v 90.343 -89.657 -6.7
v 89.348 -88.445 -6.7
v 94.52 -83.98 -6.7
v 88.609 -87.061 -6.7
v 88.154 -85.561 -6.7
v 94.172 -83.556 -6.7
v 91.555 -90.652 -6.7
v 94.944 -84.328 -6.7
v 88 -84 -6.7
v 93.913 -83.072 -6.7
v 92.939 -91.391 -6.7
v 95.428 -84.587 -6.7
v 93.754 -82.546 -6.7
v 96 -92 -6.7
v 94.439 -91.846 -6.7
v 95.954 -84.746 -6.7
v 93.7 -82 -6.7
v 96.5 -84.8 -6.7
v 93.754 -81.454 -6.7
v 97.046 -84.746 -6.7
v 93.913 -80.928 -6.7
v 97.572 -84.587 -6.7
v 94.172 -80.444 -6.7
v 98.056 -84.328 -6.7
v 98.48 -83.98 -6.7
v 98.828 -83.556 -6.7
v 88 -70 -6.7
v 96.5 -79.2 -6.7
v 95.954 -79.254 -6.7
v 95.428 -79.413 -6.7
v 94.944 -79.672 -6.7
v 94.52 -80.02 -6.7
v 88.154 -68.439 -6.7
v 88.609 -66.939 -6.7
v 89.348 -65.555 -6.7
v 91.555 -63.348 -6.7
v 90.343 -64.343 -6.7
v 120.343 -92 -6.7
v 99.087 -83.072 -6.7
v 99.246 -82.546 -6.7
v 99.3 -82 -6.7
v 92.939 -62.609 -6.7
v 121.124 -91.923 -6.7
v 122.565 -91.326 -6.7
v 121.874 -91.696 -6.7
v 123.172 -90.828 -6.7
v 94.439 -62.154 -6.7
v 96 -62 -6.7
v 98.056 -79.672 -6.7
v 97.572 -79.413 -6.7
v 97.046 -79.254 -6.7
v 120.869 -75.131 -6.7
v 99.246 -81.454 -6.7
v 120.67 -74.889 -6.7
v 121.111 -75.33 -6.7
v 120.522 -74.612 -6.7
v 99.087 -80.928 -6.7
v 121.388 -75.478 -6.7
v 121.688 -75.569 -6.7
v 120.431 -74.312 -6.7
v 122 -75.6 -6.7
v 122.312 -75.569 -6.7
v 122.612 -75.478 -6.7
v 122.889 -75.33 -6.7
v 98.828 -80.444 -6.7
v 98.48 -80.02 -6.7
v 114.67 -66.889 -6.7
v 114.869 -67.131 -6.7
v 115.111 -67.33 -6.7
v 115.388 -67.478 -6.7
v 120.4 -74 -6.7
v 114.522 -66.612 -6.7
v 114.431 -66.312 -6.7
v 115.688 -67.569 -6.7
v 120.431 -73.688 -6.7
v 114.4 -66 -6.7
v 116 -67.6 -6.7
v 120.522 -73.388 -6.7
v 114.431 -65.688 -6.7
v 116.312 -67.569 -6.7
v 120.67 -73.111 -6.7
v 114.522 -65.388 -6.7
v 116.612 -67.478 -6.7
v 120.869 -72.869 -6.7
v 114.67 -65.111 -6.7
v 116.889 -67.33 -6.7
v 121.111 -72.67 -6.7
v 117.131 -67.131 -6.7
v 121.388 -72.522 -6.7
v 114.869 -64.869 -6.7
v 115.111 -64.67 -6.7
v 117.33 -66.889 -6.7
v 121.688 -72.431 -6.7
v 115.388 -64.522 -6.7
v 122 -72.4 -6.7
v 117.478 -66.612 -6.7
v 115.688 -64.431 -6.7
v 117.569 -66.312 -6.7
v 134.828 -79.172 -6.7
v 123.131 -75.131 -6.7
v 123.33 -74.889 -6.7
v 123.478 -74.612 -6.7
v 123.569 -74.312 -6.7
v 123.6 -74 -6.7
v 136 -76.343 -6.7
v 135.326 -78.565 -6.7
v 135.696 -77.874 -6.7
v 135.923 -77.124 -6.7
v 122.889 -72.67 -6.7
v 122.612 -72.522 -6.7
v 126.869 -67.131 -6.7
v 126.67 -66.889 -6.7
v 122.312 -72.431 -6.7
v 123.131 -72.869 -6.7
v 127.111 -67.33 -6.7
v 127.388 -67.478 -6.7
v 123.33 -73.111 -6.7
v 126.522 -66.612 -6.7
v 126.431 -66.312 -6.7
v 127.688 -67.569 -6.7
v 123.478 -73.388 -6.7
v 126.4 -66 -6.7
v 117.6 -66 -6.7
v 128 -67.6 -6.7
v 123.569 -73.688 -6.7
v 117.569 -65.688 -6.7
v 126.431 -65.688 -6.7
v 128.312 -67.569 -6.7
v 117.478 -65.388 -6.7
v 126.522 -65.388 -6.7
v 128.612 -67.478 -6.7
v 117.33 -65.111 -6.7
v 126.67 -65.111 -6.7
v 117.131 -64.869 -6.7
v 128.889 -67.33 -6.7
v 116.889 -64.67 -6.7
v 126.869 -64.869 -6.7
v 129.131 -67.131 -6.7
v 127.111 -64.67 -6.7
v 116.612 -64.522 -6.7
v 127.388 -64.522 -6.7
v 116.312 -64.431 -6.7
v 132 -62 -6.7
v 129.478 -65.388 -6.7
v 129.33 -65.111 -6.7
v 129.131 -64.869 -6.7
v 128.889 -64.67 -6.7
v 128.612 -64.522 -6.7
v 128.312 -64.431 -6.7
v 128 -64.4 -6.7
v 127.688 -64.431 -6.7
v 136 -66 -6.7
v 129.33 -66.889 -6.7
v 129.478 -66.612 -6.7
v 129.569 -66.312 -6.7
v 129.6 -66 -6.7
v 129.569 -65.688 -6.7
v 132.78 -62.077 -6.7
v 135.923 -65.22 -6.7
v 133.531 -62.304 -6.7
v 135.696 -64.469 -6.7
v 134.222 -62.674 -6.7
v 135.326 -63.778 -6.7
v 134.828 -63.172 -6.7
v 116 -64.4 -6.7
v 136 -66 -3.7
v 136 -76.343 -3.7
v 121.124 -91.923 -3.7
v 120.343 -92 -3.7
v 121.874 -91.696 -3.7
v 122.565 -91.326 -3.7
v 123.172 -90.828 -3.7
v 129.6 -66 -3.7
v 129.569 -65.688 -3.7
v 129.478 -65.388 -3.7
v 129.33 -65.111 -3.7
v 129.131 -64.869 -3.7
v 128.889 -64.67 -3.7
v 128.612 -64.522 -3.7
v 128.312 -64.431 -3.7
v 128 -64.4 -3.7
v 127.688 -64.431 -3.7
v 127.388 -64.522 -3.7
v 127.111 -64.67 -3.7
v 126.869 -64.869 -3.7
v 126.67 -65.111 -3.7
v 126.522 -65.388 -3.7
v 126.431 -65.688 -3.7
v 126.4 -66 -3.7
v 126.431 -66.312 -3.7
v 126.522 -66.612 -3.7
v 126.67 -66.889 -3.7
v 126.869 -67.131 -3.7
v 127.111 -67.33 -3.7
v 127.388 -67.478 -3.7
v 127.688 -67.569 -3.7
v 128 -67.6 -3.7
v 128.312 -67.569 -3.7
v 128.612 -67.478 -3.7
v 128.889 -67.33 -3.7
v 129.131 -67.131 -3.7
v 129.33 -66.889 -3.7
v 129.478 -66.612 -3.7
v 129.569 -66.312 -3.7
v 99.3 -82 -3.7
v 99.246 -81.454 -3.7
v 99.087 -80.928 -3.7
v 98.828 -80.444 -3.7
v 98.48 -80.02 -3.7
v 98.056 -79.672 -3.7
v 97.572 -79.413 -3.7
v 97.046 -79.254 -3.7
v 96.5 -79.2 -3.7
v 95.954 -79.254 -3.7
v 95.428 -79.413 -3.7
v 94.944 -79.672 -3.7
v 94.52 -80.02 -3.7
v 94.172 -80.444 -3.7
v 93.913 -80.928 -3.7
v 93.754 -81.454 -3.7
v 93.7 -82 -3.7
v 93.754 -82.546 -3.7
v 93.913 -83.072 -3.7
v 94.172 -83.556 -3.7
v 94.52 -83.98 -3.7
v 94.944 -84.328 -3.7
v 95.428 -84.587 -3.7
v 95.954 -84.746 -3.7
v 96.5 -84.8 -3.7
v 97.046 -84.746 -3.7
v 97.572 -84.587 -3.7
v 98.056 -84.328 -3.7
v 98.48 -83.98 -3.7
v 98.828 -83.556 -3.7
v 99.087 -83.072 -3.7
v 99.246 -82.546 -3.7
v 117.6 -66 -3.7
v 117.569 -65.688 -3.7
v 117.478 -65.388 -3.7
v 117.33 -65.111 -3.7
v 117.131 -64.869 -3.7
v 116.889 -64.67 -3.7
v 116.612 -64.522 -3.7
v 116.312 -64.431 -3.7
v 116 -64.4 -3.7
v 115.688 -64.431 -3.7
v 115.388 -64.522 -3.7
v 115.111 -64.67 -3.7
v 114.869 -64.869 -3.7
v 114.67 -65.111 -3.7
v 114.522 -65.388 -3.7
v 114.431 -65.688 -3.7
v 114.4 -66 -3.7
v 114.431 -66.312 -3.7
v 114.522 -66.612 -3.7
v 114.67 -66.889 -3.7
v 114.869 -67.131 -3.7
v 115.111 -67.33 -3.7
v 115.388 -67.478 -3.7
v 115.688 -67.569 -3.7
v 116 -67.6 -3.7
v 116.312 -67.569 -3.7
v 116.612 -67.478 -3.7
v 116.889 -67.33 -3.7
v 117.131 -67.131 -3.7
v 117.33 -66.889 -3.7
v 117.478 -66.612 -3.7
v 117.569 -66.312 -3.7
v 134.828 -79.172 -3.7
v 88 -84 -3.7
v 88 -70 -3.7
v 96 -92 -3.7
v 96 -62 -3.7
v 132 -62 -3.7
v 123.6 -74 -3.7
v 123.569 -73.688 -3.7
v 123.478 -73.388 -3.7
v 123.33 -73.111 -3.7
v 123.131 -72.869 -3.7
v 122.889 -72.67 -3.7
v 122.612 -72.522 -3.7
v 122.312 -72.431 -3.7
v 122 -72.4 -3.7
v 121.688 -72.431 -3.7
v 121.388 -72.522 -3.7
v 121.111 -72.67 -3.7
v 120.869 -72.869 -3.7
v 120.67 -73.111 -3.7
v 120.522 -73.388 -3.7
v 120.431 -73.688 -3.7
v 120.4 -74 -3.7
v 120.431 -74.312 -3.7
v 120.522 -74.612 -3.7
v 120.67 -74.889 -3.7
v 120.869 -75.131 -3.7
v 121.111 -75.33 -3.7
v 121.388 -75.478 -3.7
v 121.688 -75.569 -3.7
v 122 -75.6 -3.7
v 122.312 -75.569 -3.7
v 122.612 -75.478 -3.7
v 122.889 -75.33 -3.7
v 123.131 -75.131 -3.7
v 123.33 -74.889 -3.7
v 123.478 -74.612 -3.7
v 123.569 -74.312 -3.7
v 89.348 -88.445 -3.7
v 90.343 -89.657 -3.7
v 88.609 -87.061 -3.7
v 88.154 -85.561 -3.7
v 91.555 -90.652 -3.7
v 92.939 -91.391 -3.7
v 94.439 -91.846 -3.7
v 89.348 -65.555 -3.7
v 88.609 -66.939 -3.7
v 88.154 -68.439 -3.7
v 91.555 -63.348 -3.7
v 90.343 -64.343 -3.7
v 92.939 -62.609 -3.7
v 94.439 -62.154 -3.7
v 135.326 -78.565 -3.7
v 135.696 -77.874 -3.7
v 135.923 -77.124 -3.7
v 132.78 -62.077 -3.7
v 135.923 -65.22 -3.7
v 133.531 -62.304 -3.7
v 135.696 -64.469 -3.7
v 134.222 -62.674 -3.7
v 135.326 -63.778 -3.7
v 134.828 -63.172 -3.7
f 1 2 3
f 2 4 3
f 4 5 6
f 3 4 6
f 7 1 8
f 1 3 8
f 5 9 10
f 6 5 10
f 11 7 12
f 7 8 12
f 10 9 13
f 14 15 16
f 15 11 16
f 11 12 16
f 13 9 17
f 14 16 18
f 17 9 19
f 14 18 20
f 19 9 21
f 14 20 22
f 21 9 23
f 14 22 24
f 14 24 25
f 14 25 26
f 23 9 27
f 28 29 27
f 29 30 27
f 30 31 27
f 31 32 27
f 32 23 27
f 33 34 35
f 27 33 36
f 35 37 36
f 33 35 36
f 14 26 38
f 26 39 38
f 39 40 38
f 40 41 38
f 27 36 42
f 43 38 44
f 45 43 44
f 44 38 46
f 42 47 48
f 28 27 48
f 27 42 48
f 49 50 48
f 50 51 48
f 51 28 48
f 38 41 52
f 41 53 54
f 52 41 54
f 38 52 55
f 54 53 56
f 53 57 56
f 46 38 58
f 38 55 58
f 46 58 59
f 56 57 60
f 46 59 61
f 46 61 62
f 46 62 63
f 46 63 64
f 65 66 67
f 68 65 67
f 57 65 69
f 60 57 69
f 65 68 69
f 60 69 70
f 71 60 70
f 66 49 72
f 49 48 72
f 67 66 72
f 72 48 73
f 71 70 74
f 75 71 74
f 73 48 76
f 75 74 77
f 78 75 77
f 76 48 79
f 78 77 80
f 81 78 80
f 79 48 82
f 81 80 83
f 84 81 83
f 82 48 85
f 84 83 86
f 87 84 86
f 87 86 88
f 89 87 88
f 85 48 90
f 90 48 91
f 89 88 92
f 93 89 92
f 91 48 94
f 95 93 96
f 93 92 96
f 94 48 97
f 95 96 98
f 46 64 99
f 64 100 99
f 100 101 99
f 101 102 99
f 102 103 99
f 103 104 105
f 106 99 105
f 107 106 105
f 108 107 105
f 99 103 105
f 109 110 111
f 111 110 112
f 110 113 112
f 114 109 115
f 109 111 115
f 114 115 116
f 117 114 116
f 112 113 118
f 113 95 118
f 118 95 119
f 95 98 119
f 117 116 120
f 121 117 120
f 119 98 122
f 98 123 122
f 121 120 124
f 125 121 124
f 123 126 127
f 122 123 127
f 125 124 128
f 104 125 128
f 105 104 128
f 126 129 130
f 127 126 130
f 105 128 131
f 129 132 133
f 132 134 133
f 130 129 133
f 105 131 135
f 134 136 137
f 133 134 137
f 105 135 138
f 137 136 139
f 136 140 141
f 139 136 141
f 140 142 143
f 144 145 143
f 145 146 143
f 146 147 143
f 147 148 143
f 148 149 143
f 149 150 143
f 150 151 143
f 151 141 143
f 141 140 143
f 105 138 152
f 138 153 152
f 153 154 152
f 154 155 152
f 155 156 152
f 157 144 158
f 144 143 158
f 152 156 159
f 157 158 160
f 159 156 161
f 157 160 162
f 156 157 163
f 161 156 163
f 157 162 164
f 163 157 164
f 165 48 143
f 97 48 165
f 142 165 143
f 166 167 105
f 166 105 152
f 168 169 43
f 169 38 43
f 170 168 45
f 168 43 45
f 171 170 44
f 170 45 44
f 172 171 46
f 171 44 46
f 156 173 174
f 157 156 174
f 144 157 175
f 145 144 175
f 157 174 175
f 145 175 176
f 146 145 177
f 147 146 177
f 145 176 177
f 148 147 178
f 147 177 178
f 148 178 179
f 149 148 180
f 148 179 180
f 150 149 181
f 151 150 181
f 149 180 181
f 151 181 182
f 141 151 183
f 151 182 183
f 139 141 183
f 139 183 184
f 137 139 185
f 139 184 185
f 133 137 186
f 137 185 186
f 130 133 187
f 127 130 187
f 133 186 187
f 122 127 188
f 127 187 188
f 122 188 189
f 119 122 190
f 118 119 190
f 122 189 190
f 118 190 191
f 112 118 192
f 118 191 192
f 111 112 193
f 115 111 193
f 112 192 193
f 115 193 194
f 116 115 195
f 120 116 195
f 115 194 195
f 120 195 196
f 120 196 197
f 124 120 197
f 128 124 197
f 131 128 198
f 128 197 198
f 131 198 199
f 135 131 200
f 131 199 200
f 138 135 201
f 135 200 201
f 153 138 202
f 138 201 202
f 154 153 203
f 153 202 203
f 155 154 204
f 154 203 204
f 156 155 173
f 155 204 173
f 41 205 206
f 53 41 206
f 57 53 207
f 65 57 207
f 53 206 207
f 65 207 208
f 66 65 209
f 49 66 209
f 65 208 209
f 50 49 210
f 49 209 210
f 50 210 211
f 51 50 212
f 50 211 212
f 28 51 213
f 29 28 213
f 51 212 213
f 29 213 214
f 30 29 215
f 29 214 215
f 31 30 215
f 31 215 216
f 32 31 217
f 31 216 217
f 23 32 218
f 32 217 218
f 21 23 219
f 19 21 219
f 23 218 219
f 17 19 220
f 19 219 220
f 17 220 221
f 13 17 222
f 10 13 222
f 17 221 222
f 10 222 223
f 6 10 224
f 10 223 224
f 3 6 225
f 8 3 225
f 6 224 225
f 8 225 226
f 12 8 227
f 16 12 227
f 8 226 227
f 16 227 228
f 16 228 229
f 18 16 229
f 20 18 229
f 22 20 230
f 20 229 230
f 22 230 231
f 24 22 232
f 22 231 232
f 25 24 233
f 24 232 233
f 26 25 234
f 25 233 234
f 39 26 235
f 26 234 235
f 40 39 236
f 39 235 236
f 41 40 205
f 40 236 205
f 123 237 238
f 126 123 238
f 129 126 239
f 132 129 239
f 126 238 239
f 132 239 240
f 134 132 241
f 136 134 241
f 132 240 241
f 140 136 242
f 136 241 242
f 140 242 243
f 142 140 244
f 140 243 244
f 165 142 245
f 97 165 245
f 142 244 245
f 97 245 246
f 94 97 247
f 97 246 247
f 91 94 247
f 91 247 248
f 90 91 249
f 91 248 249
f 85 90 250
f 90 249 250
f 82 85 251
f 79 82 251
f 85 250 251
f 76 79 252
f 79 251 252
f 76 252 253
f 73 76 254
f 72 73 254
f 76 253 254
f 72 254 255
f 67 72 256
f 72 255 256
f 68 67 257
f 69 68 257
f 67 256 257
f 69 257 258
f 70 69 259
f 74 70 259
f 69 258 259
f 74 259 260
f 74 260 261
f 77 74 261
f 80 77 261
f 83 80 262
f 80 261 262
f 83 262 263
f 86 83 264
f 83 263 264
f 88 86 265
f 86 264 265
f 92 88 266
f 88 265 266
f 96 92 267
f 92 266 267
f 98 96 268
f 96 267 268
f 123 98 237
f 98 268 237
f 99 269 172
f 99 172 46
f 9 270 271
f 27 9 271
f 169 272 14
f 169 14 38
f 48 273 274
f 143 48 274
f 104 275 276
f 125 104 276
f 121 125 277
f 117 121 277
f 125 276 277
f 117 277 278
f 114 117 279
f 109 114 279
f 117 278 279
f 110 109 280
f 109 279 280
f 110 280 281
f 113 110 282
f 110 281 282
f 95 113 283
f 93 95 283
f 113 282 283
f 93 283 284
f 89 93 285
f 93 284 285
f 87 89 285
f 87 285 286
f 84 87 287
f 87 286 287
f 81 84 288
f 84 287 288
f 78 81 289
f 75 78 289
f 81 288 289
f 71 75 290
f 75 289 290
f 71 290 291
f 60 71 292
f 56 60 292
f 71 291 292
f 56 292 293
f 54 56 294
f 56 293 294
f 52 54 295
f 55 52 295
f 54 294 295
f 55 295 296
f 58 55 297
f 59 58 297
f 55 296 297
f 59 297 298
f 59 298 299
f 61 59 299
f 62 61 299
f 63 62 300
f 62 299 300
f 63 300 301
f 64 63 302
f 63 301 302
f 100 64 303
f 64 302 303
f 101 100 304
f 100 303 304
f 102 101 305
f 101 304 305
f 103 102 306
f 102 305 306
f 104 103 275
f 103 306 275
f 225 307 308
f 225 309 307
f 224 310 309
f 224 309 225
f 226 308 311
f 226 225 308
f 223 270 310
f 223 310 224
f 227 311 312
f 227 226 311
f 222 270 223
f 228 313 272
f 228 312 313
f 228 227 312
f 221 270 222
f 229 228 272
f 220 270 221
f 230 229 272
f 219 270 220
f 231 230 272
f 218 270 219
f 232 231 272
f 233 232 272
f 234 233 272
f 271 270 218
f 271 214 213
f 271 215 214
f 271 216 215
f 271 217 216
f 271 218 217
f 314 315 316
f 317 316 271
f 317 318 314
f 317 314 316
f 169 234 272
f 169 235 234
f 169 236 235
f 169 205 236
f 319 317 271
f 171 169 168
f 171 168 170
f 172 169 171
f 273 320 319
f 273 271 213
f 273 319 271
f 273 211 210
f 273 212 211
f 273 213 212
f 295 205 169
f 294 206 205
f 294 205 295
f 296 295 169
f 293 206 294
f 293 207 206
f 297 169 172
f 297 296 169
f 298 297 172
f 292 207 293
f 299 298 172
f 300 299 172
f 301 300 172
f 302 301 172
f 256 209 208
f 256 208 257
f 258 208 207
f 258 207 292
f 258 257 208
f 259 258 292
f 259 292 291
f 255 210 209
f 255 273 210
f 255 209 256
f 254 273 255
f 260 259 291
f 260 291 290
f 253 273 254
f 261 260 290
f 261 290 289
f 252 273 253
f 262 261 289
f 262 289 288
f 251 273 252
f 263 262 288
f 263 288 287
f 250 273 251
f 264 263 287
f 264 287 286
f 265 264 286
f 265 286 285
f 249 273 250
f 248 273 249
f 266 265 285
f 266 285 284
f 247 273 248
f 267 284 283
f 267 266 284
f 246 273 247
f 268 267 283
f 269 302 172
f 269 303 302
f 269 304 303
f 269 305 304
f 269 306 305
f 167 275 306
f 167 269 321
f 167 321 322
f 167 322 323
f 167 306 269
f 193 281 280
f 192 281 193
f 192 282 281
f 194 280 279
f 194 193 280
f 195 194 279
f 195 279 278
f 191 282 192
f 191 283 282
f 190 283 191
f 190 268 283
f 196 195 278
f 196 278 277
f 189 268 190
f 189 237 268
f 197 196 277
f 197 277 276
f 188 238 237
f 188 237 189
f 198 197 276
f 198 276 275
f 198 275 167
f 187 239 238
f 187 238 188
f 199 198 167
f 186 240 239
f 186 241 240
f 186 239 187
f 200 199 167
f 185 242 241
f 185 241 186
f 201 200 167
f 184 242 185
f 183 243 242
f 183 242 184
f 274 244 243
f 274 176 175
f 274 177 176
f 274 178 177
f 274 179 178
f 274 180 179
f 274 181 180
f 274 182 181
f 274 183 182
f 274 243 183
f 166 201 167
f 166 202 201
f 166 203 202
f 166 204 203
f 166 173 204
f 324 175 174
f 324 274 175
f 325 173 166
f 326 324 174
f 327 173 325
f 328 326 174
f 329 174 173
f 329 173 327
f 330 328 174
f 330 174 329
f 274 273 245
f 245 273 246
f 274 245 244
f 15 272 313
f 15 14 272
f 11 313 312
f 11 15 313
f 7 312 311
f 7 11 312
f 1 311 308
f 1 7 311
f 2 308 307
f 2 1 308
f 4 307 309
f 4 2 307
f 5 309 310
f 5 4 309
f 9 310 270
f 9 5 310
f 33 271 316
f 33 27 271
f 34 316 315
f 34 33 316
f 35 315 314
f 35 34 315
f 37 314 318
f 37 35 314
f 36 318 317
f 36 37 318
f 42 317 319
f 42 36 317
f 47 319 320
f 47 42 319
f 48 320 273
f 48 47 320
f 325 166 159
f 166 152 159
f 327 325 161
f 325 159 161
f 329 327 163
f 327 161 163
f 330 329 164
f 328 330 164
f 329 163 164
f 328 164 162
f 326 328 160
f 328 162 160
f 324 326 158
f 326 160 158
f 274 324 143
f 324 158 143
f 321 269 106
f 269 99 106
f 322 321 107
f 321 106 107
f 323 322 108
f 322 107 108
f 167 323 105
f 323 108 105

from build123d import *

# Parameters (mm, degrees)
SKETCH070_W     = 48
SKETCH070_H     = 30
SKETCH070_R     = 2.8
SKETCH070_R_2   = 1.6
PAD025_DEPTH    = 3
CHAMFER029_SIZE = 14
FILLET015_R     = 8
FILLET016_R     = 4


with BuildPart() as part:
    # Sketch070 → Pad025 (new body)
    with BuildSketch(Plane.XY):
        with Locations((4, 5)):
            Rectangle(SKETCH070_W, SKETCH070_H)
        with Locations((-11.5, 0)):
            Circle(SKETCH070_R, mode=Mode.SUBTRACT)
        with Locations((8, 16)):
            Circle(SKETCH070_R_2, mode=Mode.SUBTRACT)
        with Locations((20, 16)):
            Circle(SKETCH070_R_2, mode=Mode.SUBTRACT)
        with Locations((14, 8)):
            Circle(SKETCH070_R_2, mode=Mode.SUBTRACT)
    extrude(amount=-PAD025_DEPTH)

    # Chamfer029
    chamfer029_edges = [part.edges().sort_by_distance(p)[0] for p in [
        (28, -10, -1.5),
    ]]
    chamfer(chamfer029_edges, length=CHAMFER029_SIZE)

    # Fillet015
    fillet015_edges = [part.edges().sort_by_distance(p)[0] for p in [
        (-20, -10, -1.5),
        (-20, 20, -1.5),
    ]]
    fillet(fillet015_edges, radius=FILLET015_R)

    # Fillet016
    fillet016_edges = [part.edges().sort_by_distance(p)[0] for p in [
        (28, 20, -1.5),
        (28, 4, -1.5),
        (14, -10, -1.5),
    ]]
    fillet(fillet016_edges, radius=FILLET016_R)


with BuildPart() as part_1:
    # Body014 placement: moved
    add(part.part.moved(Location((108, -82, -3.7))))


solid = part_1.part
